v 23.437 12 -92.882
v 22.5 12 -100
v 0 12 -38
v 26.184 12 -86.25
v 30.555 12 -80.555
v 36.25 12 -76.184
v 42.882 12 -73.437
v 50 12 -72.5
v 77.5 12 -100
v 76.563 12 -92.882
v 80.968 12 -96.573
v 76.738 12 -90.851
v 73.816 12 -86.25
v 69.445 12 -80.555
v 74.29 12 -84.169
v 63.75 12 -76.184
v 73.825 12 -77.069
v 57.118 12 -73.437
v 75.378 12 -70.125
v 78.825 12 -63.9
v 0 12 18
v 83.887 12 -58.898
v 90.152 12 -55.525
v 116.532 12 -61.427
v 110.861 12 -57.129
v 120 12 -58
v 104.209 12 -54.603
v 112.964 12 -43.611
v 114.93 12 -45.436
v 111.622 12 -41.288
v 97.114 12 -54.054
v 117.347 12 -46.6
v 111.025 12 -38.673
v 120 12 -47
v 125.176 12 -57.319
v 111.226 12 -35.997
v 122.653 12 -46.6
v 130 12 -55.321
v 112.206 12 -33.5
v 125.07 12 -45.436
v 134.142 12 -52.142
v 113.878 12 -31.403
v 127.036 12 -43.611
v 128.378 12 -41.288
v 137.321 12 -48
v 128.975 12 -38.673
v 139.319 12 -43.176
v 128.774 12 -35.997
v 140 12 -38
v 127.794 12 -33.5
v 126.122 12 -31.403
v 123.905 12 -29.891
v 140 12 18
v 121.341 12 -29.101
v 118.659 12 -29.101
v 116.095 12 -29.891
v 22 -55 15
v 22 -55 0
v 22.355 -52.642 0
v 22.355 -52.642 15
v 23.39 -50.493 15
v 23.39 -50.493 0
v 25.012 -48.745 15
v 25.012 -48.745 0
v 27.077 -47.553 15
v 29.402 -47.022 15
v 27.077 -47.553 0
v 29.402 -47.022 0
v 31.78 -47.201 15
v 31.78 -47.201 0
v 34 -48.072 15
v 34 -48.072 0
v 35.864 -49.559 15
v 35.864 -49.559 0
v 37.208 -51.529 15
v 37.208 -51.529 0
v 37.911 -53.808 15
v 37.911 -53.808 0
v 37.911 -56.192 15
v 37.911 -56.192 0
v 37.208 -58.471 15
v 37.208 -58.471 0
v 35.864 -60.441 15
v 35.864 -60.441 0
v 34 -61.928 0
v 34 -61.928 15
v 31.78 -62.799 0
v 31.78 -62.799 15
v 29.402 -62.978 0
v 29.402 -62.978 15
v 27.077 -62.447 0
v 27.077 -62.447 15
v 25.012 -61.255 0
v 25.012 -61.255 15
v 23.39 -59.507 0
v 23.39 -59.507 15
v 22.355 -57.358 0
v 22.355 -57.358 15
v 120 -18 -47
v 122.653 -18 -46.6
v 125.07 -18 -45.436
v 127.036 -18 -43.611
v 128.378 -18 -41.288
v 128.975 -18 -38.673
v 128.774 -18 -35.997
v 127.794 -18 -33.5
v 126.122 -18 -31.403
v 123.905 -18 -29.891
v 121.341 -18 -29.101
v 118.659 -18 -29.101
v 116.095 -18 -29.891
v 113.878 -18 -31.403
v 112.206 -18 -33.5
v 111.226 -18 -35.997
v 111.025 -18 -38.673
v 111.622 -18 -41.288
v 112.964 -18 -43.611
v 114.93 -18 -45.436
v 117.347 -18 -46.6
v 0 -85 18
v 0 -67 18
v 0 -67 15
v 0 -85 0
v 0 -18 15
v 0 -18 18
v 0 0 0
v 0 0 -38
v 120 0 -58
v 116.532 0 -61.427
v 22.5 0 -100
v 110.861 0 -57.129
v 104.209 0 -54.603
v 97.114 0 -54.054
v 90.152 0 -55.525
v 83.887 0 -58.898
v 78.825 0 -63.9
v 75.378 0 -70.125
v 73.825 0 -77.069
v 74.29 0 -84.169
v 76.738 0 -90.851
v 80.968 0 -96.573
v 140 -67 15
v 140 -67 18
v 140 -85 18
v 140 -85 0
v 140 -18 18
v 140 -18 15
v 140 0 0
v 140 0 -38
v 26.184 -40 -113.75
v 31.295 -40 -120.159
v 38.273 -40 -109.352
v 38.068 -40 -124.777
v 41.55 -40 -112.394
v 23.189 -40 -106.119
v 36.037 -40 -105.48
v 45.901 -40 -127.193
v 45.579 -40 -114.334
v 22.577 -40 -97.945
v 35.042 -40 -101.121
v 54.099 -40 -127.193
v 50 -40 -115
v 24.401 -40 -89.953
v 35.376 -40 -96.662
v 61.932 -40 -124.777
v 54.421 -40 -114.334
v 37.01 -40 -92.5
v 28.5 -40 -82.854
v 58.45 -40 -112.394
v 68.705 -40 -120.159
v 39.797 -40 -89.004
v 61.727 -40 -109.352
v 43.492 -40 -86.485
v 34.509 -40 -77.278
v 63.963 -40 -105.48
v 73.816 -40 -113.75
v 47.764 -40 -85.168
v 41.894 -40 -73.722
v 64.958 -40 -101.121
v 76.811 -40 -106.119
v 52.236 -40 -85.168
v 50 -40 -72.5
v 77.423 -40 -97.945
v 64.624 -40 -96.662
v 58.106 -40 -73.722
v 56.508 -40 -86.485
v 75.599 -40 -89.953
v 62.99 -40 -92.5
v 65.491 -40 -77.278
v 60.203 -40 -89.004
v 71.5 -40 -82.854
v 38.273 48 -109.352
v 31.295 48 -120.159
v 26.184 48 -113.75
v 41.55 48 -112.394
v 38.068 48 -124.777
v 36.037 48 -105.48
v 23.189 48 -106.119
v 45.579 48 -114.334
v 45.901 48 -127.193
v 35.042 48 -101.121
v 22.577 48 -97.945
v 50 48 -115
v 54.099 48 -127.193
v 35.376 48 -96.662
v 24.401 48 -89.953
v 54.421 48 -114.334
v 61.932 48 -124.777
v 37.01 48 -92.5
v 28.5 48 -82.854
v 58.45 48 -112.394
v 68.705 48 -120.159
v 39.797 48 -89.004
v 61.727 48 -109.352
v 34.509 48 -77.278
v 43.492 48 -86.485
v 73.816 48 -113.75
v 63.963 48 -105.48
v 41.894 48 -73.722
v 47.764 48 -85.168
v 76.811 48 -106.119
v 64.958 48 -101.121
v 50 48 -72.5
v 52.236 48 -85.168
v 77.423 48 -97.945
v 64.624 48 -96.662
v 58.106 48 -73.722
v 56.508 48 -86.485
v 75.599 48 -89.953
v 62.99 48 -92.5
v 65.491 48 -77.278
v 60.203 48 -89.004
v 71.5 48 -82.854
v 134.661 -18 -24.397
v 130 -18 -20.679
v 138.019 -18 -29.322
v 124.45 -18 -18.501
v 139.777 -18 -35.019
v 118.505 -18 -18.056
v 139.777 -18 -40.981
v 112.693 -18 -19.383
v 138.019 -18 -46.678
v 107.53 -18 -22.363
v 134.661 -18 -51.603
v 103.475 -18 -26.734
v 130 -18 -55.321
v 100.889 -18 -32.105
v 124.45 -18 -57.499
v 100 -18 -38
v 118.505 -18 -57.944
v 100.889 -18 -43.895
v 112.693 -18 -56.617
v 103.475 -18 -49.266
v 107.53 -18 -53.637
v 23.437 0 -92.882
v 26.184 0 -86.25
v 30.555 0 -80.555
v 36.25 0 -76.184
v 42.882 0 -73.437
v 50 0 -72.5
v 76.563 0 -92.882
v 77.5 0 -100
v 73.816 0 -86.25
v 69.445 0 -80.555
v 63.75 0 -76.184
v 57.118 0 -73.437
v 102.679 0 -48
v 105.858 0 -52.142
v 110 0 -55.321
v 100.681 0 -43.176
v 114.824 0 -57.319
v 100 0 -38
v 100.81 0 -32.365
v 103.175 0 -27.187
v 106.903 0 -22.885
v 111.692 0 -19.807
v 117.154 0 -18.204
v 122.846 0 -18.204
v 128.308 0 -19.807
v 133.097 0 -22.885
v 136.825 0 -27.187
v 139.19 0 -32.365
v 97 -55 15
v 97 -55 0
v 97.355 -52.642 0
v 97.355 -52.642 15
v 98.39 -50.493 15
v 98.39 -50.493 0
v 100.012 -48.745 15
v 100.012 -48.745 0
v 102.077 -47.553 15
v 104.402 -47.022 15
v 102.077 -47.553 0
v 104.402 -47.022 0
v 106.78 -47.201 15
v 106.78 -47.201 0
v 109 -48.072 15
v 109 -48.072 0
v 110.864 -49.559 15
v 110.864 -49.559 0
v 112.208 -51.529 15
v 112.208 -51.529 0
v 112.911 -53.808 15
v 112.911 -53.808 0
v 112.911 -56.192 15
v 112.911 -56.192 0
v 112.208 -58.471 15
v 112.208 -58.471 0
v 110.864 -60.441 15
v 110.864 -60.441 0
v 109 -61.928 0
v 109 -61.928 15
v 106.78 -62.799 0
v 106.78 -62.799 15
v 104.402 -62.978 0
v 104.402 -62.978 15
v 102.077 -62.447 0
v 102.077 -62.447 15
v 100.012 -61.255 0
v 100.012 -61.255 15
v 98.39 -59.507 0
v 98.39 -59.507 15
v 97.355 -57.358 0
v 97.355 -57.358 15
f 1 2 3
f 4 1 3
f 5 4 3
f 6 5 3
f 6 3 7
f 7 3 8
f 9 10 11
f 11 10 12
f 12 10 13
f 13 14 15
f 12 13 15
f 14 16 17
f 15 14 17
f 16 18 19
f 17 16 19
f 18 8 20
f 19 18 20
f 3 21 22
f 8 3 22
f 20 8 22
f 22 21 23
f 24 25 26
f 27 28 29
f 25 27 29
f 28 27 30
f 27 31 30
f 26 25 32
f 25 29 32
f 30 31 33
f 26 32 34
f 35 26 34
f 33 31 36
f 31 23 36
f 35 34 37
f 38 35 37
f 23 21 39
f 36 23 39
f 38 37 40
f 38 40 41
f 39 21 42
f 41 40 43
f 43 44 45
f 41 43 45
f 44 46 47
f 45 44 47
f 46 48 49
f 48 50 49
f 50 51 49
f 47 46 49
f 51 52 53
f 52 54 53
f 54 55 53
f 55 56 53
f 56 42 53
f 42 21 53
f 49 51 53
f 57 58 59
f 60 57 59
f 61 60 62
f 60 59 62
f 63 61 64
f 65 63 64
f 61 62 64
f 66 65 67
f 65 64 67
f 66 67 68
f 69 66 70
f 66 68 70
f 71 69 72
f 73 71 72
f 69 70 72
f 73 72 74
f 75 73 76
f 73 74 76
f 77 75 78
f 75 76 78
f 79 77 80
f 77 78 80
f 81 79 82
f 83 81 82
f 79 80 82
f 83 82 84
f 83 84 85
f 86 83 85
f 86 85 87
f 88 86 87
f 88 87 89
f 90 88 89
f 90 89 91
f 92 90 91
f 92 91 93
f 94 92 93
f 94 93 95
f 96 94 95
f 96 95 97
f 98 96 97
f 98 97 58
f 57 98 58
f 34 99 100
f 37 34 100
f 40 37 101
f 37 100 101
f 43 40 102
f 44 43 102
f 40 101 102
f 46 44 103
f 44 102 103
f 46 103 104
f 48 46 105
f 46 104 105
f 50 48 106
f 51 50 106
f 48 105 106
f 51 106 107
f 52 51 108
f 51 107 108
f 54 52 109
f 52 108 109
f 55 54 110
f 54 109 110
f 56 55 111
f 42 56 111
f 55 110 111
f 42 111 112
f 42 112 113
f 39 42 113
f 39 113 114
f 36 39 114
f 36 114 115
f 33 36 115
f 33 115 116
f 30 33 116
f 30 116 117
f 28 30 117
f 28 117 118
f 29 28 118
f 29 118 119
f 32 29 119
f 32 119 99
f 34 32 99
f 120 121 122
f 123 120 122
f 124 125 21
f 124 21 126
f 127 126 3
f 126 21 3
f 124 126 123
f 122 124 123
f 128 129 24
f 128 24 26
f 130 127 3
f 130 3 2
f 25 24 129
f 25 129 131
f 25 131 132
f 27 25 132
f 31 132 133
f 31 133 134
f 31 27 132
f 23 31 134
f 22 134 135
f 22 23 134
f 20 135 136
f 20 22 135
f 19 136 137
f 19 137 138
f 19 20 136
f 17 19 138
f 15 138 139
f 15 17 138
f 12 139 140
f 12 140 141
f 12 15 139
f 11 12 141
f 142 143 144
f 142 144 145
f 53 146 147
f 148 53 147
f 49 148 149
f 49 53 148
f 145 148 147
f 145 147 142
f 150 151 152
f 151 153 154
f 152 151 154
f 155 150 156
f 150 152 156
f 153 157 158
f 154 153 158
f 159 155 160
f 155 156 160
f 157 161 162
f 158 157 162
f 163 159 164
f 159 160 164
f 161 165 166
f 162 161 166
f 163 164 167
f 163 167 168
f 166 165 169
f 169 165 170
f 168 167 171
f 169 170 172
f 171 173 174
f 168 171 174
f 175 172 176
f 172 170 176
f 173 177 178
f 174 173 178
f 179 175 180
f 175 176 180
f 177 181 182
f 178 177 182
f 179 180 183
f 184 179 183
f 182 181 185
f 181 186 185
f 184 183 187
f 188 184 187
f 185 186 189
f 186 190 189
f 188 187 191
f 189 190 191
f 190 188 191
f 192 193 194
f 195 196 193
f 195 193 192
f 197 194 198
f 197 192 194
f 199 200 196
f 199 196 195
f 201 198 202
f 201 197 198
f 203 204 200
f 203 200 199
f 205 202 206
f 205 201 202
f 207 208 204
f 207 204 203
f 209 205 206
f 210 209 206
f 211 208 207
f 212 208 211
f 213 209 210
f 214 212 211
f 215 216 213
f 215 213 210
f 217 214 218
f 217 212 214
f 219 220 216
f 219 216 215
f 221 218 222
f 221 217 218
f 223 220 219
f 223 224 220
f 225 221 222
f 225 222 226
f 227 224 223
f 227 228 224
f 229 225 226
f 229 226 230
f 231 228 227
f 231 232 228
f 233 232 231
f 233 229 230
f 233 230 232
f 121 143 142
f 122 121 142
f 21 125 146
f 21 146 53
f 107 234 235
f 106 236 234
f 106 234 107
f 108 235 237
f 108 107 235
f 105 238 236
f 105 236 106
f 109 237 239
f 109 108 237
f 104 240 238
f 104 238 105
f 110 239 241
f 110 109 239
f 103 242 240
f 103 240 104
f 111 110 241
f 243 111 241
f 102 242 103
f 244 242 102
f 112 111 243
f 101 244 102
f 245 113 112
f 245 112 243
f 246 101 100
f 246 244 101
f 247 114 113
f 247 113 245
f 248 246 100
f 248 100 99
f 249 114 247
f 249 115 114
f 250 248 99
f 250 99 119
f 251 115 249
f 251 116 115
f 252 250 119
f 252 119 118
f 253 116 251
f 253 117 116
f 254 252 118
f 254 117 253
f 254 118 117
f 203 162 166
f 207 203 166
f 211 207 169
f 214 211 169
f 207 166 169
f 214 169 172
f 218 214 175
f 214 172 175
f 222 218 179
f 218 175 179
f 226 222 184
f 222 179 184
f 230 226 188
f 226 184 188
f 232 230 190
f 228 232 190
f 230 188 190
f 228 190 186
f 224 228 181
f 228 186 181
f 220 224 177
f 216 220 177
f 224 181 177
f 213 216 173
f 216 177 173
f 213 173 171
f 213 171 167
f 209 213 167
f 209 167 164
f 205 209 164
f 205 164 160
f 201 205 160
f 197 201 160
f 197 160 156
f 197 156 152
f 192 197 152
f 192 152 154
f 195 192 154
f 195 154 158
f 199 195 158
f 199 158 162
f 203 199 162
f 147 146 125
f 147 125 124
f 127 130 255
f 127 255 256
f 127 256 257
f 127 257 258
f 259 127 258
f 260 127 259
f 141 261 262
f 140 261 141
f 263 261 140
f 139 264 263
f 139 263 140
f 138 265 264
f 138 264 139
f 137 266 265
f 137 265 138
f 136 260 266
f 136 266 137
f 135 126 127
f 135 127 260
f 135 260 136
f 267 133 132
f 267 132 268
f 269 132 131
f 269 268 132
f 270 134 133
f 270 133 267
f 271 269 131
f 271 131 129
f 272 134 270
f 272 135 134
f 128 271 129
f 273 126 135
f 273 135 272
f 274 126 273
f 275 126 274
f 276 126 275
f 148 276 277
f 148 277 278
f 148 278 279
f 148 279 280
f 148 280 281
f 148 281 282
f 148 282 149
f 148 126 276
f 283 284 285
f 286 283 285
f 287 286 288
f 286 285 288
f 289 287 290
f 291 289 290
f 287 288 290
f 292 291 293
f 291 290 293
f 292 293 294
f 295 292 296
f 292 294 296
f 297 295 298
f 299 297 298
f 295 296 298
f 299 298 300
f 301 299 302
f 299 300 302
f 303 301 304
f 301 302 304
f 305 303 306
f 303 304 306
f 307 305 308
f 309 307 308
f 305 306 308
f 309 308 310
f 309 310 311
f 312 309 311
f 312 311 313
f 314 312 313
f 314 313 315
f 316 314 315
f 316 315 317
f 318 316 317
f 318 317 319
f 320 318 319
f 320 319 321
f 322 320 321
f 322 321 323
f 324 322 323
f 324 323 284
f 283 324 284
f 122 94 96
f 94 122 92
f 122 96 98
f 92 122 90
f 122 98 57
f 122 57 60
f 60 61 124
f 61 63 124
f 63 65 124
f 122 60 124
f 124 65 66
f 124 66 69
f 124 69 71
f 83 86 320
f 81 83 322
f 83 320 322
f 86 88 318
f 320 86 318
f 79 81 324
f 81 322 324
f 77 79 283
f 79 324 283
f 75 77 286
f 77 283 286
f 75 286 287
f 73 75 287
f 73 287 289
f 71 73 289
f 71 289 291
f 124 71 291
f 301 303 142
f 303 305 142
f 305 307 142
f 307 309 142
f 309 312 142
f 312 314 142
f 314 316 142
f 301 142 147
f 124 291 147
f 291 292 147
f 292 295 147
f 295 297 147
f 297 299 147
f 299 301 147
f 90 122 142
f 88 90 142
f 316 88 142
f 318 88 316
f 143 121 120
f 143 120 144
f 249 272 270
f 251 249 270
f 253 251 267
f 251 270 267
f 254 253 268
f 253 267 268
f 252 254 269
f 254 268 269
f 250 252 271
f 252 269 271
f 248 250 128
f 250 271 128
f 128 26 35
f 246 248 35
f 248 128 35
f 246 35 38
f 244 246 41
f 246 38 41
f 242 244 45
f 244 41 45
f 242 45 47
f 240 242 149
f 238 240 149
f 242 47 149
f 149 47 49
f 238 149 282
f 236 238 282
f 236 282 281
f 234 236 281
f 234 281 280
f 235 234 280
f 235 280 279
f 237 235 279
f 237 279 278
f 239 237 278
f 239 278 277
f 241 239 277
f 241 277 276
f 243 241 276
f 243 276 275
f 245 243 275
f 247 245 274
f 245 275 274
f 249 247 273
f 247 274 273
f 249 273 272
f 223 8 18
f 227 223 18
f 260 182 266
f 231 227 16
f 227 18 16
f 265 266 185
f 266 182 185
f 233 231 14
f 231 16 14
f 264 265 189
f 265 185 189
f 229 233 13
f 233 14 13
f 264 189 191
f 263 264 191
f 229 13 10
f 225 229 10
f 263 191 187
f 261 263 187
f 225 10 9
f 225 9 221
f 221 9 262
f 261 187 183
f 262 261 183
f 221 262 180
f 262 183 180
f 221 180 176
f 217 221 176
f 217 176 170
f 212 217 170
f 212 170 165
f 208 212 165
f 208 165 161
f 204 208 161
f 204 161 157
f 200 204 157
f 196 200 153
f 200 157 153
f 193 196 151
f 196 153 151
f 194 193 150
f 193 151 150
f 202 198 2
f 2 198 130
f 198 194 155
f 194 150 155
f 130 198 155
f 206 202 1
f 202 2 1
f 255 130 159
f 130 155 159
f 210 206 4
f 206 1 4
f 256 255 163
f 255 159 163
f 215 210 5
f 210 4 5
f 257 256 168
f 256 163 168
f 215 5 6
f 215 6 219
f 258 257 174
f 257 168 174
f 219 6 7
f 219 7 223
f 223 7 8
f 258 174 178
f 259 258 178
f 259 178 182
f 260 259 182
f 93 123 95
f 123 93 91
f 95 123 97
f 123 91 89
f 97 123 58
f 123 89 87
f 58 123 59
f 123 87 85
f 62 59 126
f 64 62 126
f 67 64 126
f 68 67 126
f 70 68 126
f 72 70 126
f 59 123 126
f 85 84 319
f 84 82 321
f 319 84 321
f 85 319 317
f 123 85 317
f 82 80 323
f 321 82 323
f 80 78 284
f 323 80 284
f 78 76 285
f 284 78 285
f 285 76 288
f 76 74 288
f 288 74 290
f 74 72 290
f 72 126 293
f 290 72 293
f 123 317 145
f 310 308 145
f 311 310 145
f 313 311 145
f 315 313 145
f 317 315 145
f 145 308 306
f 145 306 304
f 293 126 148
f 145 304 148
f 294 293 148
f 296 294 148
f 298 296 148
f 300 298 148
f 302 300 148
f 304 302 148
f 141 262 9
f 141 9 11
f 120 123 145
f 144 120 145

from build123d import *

# Parameters (mm, degrees)
SKETCH1_W                = 140
SKETCH1_H                = 85
BOSS_EXTRUDE1_DEPTH      = 18
SKETCH2_W                = 3
SKETCH2_H                = 49
CUT_EXTRUDE1_DEPTH       = 220
SKETCH3_R                = 8
CUT_EXTRUDE4_DEPTH       = 30
SKETCH5_W                = 56
SKETCH5_H                = 12
BOSS_EXTRUDE2_DEPTH      = 140
BOSS_EXTRUDE3_DEPTH      = 18
BOSS_EXTRUDE3_DEPTH_BACK = 12
SKETCH7_R                = 20
SKETCH8_R                = 9
CUT_EXTRUDE5_DEPTH       = 50
BOSS_EXTRUDE4_DEPTH      = 12
BOSS_EXTRUDE6_DEPTH      = 36
BOSS_EXTRUDE6_DEPTH_BACK = 52
SKETCH11_R               = 27.5
SKETCH12_R               = 15
CUT_EXTRUDE6_DEPTH       = 109
CUT_EXTRUDE11_DEPTH      = 12


with BuildPart() as part:
    # Sketch1 → Boss-Extrude1 (new body)
    with BuildSketch(Plane.XY):
        with Locations((70, -42.5)):
            Rectangle(SKETCH1_W, SKETCH1_H)
    extrude(amount=BOSS_EXTRUDE1_DEPTH)

    # Sketch2 → Cut-Extrude1 (cut)
    with BuildSketch(Plane(origin=(140, 0, 0), x_dir=(0, 0, -1), z_dir=(1, 0, 0))):
        with Locations((-16.5, -42.5)):
            Rectangle(SKETCH2_W, SKETCH2_H)
    extrude(amount=-CUT_EXTRUDE1_DEPTH, mode=Mode.SUBTRACT)

    # Sketch3 → Cut-Extrude4 (cut)
    with BuildSketch(Plane(origin=(0, 0, 0), x_dir=(-1, 0, 0), z_dir=(0, 0, -1))):
        with Locations((-105, -55)):
            Circle(SKETCH3_R)
        with Locations((-30, -55)):
            Circle(SKETCH3_R)
    extrude(amount=-CUT_EXTRUDE4_DEPTH, mode=Mode.SUBTRACT)

    # Sketch5 → Boss-Extrude2 (add)
    with BuildSketch(Plane(origin=(140, 0, 0), x_dir=(0, 0, -1), z_dir=(1, 0, 0))):
        with Locations((10, 6)):
            Rectangle(SKETCH5_W, SKETCH5_H)
    extrude(amount=-BOSS_EXTRUDE2_DEPTH)

    # Sketch7 → Boss-Extrude3 (add, two sides: drawn at the far end of the back side and taken through both)
    with BuildSketch(Plane.XZ.offset(-BOSS_EXTRUDE3_DEPTH_BACK)):
        with Locations(Location((120, -38, 0), (0, 0, 180))):
            Circle(SKETCH7_R)
    extrude(amount=BOSS_EXTRUDE3_DEPTH + BOSS_EXTRUDE3_DEPTH_BACK)

    # Sketch8 → Cut-Extrude5 (cut)
    with BuildSketch(Plane(origin=(0, -18, 0), x_dir=(-1, 0, 0), z_dir=(0, -1, 0))):
        with Locations(Location((-120, 38, 0), (0, 0, 90))):
            Circle(SKETCH8_R)
    extrude(amount=-CUT_EXTRUDE5_DEPTH, mode=Mode.SUBTRACT)

    # Sketch10 → Boss-Extrude4 (add)
    with BuildSketch(Plane.XZ):
        with BuildLine():
            Line((0, -38), (22.5, -100))
            ThreePointArc((22.5, -100), (50, -72.5), (77.5, -100))
            Line((77.5, -100), (120, -58))
            ThreePointArc((120, -58), (105.857864376, -52.142135624), (100, -38))
            Line((100, -38), (0, -38))
        make_face()
    extrude(amount=-BOSS_EXTRUDE4_DEPTH)

    # Sketch11 → Boss-Extrude6 (add, two sides: drawn at the far end of the back side and taken through both)
    with BuildSketch(Plane(origin=(0, 12, 0), x_dir=(1, 0, 0), z_dir=(0, 1, 0)).offset(-BOSS_EXTRUDE6_DEPTH_BACK)):
        with Locations(Location((50, 100, 0), (0, 0, 270))):
            Circle(SKETCH11_R)
    extrude(amount=BOSS_EXTRUDE6_DEPTH + BOSS_EXTRUDE6_DEPTH_BACK)

    # Sketch12 → Cut-Extrude6 (cut)
    with BuildSketch(Plane.XZ.offset(40)):
        with Locations(Location((50, -100, 0), (0, 0, 270))):
            Circle(SKETCH12_R)
    extrude(amount=-CUT_EXTRUDE6_DEPTH, mode=Mode.SUBTRACT)

    # Sketch14 → Cut-Extrude11 (cut)
    with BuildSketch(Plane(origin=(0, 12, 0), x_dir=(1, 0, 0), z_dir=(0, 1, 0))):
        with BuildLine():
            Line((80.968040171, 96.572760302), (116.531959829, 61.427239698))
            ThreePointArc((116.531959829, 61.427239698), (81.177239698, 61.218040171), (80.968040171, 96.572760302))
        make_face()
    extrude(amount=-CUT_EXTRUDE11_DEPTH, mode=Mode.SUBTRACT)


solid = part.part
